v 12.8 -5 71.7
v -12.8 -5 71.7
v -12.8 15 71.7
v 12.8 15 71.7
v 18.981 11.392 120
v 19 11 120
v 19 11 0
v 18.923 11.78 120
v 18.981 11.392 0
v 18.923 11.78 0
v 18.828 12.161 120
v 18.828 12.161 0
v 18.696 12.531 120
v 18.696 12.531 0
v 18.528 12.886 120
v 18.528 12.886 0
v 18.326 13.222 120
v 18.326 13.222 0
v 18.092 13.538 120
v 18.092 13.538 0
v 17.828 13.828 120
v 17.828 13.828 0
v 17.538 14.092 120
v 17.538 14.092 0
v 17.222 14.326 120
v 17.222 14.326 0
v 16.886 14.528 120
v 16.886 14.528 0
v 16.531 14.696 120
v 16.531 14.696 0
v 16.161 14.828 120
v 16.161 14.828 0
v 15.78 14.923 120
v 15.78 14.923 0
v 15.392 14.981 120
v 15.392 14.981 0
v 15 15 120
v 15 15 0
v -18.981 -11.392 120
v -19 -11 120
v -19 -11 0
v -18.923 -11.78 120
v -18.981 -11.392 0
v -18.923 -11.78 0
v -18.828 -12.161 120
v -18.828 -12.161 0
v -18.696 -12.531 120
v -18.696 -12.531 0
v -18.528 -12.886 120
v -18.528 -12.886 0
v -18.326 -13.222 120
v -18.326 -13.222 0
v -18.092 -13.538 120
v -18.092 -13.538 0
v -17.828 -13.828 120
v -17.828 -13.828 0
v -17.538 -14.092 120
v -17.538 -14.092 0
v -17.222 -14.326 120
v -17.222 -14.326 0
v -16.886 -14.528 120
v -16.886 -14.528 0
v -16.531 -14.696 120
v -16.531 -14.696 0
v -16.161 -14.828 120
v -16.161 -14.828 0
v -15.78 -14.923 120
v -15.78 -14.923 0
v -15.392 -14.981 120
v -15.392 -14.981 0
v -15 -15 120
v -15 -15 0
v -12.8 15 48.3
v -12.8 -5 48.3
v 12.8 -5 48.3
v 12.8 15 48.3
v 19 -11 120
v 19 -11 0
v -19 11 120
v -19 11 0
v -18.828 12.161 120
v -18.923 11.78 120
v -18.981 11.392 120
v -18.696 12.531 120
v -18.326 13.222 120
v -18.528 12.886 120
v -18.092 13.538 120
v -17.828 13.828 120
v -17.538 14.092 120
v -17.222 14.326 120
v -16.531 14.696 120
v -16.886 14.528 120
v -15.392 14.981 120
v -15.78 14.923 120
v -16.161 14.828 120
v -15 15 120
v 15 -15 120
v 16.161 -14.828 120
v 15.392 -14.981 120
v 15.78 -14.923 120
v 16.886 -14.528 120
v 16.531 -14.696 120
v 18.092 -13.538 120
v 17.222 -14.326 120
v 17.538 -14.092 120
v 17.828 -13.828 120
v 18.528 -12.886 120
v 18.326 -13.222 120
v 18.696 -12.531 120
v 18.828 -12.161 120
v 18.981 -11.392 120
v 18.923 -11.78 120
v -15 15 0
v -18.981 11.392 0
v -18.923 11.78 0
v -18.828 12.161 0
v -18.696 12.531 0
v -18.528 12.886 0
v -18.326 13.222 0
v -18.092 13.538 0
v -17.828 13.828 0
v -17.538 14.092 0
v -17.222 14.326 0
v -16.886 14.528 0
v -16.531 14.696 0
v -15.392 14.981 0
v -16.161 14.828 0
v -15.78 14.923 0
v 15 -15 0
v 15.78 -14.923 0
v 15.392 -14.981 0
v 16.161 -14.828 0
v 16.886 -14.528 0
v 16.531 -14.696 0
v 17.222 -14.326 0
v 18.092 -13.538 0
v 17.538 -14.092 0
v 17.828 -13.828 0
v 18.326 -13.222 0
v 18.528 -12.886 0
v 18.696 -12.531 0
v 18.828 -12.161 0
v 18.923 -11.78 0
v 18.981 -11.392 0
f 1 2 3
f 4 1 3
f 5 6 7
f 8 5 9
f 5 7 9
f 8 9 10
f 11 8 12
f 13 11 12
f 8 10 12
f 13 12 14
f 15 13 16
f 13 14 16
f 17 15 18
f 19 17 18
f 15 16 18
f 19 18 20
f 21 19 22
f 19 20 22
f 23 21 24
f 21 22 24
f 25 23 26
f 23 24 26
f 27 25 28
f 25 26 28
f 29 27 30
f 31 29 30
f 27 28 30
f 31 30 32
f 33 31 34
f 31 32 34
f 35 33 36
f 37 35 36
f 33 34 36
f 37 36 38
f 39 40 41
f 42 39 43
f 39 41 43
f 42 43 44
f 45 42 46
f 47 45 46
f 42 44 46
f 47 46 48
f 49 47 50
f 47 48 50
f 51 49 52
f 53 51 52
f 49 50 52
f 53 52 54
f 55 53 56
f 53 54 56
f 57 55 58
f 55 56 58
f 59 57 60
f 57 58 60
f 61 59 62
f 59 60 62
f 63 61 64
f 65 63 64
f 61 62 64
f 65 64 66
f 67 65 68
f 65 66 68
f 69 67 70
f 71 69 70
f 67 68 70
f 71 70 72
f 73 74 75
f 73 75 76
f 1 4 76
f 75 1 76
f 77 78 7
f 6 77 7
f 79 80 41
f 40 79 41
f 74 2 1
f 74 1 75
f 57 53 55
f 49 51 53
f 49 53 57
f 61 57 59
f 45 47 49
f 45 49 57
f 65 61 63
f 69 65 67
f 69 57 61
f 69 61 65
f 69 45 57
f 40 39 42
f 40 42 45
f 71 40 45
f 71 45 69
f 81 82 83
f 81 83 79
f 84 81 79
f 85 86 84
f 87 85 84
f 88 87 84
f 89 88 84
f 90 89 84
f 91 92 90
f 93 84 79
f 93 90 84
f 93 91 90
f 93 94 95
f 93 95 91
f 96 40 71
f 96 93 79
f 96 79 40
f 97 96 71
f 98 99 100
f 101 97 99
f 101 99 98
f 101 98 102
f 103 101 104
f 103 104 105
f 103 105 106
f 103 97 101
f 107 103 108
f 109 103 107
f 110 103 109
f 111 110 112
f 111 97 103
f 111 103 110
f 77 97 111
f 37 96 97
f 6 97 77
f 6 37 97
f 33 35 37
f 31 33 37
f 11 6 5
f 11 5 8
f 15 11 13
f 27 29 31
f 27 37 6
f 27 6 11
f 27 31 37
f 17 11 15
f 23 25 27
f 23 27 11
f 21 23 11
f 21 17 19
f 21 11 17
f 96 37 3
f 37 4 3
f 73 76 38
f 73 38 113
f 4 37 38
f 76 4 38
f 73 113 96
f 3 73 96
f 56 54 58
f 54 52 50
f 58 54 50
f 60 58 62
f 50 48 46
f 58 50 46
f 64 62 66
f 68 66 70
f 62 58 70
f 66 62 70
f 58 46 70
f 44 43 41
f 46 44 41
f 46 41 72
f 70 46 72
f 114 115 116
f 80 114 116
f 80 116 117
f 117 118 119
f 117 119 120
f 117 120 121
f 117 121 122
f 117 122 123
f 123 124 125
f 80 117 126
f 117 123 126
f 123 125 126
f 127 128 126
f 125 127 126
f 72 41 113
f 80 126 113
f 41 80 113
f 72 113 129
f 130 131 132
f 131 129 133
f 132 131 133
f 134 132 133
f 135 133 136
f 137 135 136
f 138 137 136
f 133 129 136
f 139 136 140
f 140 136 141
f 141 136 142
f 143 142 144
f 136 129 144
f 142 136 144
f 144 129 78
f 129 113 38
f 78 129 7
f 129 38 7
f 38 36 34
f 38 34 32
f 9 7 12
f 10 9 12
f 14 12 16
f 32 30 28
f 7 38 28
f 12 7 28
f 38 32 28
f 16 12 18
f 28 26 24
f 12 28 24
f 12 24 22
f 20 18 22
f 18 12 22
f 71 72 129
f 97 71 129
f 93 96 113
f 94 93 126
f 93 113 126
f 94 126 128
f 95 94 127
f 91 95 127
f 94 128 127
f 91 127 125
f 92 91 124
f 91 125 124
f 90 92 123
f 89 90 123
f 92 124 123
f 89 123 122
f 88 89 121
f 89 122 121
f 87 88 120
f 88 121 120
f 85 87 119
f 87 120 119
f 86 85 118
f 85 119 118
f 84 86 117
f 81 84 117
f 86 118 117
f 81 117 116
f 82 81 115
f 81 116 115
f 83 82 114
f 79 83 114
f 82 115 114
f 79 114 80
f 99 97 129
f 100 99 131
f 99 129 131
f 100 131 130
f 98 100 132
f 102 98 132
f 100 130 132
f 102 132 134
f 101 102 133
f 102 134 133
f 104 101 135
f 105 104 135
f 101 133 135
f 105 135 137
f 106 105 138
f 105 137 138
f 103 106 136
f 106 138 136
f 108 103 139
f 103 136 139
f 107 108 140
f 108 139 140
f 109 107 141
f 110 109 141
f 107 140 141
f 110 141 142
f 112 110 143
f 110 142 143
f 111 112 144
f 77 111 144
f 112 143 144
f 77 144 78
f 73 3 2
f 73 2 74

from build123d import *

# Parameters (mm, degrees)
BOSS_EXTRUDE2_DEPTH     = 120
CUT_EXTRUDE1_DEPTH      = 12.8
CUT_EXTRUDE1_DEPTH_BACK = 12.8
SKETCH5_W               = 23.4
SKETCH5_H               = 29


with BuildPart() as part:
    # Sketch4 → Boss-Extrude2 (new body)
    with BuildSketch(Plane.XY):
        with BuildLine():
            Line((-15, -15), (15, -15))
            ThreePointArc((15, -15), (17.828427125, -13.828427125), (19, -11))
            Line((19, -11), (19, 11))
            ThreePointArc((19, 11), (17.828427125, 13.828427125), (15, 15))
            Line((15, 15), (-15, 15))
            ThreePointArc((-15, 15), (-17.828427125, 13.828427125), (-19, 11))
            Line((-19, 11), (-19, -11))
            ThreePointArc((-19, -11), (-17.828427125, -13.828427125), (-15, -15))
        make_face()
    extrude(amount=BOSS_EXTRUDE2_DEPTH)

    # Sketch5 → Cut-Extrude1 (cut, two sides: drawn at the far end of the back side and taken through both)
    with BuildSketch(Plane(origin=(0, 0, 0), x_dir=(0, 0, -1), z_dir=(1, 0, 0)).offset(-CUT_EXTRUDE1_DEPTH_BACK)):
        with Locations((-60, 9.5)):
            Rectangle(SKETCH5_W, SKETCH5_H)
    extrude(amount=CUT_EXTRUDE1_DEPTH + CUT_EXTRUDE1_DEPTH_BACK, mode=Mode.SUBTRACT)


solid = part.part
